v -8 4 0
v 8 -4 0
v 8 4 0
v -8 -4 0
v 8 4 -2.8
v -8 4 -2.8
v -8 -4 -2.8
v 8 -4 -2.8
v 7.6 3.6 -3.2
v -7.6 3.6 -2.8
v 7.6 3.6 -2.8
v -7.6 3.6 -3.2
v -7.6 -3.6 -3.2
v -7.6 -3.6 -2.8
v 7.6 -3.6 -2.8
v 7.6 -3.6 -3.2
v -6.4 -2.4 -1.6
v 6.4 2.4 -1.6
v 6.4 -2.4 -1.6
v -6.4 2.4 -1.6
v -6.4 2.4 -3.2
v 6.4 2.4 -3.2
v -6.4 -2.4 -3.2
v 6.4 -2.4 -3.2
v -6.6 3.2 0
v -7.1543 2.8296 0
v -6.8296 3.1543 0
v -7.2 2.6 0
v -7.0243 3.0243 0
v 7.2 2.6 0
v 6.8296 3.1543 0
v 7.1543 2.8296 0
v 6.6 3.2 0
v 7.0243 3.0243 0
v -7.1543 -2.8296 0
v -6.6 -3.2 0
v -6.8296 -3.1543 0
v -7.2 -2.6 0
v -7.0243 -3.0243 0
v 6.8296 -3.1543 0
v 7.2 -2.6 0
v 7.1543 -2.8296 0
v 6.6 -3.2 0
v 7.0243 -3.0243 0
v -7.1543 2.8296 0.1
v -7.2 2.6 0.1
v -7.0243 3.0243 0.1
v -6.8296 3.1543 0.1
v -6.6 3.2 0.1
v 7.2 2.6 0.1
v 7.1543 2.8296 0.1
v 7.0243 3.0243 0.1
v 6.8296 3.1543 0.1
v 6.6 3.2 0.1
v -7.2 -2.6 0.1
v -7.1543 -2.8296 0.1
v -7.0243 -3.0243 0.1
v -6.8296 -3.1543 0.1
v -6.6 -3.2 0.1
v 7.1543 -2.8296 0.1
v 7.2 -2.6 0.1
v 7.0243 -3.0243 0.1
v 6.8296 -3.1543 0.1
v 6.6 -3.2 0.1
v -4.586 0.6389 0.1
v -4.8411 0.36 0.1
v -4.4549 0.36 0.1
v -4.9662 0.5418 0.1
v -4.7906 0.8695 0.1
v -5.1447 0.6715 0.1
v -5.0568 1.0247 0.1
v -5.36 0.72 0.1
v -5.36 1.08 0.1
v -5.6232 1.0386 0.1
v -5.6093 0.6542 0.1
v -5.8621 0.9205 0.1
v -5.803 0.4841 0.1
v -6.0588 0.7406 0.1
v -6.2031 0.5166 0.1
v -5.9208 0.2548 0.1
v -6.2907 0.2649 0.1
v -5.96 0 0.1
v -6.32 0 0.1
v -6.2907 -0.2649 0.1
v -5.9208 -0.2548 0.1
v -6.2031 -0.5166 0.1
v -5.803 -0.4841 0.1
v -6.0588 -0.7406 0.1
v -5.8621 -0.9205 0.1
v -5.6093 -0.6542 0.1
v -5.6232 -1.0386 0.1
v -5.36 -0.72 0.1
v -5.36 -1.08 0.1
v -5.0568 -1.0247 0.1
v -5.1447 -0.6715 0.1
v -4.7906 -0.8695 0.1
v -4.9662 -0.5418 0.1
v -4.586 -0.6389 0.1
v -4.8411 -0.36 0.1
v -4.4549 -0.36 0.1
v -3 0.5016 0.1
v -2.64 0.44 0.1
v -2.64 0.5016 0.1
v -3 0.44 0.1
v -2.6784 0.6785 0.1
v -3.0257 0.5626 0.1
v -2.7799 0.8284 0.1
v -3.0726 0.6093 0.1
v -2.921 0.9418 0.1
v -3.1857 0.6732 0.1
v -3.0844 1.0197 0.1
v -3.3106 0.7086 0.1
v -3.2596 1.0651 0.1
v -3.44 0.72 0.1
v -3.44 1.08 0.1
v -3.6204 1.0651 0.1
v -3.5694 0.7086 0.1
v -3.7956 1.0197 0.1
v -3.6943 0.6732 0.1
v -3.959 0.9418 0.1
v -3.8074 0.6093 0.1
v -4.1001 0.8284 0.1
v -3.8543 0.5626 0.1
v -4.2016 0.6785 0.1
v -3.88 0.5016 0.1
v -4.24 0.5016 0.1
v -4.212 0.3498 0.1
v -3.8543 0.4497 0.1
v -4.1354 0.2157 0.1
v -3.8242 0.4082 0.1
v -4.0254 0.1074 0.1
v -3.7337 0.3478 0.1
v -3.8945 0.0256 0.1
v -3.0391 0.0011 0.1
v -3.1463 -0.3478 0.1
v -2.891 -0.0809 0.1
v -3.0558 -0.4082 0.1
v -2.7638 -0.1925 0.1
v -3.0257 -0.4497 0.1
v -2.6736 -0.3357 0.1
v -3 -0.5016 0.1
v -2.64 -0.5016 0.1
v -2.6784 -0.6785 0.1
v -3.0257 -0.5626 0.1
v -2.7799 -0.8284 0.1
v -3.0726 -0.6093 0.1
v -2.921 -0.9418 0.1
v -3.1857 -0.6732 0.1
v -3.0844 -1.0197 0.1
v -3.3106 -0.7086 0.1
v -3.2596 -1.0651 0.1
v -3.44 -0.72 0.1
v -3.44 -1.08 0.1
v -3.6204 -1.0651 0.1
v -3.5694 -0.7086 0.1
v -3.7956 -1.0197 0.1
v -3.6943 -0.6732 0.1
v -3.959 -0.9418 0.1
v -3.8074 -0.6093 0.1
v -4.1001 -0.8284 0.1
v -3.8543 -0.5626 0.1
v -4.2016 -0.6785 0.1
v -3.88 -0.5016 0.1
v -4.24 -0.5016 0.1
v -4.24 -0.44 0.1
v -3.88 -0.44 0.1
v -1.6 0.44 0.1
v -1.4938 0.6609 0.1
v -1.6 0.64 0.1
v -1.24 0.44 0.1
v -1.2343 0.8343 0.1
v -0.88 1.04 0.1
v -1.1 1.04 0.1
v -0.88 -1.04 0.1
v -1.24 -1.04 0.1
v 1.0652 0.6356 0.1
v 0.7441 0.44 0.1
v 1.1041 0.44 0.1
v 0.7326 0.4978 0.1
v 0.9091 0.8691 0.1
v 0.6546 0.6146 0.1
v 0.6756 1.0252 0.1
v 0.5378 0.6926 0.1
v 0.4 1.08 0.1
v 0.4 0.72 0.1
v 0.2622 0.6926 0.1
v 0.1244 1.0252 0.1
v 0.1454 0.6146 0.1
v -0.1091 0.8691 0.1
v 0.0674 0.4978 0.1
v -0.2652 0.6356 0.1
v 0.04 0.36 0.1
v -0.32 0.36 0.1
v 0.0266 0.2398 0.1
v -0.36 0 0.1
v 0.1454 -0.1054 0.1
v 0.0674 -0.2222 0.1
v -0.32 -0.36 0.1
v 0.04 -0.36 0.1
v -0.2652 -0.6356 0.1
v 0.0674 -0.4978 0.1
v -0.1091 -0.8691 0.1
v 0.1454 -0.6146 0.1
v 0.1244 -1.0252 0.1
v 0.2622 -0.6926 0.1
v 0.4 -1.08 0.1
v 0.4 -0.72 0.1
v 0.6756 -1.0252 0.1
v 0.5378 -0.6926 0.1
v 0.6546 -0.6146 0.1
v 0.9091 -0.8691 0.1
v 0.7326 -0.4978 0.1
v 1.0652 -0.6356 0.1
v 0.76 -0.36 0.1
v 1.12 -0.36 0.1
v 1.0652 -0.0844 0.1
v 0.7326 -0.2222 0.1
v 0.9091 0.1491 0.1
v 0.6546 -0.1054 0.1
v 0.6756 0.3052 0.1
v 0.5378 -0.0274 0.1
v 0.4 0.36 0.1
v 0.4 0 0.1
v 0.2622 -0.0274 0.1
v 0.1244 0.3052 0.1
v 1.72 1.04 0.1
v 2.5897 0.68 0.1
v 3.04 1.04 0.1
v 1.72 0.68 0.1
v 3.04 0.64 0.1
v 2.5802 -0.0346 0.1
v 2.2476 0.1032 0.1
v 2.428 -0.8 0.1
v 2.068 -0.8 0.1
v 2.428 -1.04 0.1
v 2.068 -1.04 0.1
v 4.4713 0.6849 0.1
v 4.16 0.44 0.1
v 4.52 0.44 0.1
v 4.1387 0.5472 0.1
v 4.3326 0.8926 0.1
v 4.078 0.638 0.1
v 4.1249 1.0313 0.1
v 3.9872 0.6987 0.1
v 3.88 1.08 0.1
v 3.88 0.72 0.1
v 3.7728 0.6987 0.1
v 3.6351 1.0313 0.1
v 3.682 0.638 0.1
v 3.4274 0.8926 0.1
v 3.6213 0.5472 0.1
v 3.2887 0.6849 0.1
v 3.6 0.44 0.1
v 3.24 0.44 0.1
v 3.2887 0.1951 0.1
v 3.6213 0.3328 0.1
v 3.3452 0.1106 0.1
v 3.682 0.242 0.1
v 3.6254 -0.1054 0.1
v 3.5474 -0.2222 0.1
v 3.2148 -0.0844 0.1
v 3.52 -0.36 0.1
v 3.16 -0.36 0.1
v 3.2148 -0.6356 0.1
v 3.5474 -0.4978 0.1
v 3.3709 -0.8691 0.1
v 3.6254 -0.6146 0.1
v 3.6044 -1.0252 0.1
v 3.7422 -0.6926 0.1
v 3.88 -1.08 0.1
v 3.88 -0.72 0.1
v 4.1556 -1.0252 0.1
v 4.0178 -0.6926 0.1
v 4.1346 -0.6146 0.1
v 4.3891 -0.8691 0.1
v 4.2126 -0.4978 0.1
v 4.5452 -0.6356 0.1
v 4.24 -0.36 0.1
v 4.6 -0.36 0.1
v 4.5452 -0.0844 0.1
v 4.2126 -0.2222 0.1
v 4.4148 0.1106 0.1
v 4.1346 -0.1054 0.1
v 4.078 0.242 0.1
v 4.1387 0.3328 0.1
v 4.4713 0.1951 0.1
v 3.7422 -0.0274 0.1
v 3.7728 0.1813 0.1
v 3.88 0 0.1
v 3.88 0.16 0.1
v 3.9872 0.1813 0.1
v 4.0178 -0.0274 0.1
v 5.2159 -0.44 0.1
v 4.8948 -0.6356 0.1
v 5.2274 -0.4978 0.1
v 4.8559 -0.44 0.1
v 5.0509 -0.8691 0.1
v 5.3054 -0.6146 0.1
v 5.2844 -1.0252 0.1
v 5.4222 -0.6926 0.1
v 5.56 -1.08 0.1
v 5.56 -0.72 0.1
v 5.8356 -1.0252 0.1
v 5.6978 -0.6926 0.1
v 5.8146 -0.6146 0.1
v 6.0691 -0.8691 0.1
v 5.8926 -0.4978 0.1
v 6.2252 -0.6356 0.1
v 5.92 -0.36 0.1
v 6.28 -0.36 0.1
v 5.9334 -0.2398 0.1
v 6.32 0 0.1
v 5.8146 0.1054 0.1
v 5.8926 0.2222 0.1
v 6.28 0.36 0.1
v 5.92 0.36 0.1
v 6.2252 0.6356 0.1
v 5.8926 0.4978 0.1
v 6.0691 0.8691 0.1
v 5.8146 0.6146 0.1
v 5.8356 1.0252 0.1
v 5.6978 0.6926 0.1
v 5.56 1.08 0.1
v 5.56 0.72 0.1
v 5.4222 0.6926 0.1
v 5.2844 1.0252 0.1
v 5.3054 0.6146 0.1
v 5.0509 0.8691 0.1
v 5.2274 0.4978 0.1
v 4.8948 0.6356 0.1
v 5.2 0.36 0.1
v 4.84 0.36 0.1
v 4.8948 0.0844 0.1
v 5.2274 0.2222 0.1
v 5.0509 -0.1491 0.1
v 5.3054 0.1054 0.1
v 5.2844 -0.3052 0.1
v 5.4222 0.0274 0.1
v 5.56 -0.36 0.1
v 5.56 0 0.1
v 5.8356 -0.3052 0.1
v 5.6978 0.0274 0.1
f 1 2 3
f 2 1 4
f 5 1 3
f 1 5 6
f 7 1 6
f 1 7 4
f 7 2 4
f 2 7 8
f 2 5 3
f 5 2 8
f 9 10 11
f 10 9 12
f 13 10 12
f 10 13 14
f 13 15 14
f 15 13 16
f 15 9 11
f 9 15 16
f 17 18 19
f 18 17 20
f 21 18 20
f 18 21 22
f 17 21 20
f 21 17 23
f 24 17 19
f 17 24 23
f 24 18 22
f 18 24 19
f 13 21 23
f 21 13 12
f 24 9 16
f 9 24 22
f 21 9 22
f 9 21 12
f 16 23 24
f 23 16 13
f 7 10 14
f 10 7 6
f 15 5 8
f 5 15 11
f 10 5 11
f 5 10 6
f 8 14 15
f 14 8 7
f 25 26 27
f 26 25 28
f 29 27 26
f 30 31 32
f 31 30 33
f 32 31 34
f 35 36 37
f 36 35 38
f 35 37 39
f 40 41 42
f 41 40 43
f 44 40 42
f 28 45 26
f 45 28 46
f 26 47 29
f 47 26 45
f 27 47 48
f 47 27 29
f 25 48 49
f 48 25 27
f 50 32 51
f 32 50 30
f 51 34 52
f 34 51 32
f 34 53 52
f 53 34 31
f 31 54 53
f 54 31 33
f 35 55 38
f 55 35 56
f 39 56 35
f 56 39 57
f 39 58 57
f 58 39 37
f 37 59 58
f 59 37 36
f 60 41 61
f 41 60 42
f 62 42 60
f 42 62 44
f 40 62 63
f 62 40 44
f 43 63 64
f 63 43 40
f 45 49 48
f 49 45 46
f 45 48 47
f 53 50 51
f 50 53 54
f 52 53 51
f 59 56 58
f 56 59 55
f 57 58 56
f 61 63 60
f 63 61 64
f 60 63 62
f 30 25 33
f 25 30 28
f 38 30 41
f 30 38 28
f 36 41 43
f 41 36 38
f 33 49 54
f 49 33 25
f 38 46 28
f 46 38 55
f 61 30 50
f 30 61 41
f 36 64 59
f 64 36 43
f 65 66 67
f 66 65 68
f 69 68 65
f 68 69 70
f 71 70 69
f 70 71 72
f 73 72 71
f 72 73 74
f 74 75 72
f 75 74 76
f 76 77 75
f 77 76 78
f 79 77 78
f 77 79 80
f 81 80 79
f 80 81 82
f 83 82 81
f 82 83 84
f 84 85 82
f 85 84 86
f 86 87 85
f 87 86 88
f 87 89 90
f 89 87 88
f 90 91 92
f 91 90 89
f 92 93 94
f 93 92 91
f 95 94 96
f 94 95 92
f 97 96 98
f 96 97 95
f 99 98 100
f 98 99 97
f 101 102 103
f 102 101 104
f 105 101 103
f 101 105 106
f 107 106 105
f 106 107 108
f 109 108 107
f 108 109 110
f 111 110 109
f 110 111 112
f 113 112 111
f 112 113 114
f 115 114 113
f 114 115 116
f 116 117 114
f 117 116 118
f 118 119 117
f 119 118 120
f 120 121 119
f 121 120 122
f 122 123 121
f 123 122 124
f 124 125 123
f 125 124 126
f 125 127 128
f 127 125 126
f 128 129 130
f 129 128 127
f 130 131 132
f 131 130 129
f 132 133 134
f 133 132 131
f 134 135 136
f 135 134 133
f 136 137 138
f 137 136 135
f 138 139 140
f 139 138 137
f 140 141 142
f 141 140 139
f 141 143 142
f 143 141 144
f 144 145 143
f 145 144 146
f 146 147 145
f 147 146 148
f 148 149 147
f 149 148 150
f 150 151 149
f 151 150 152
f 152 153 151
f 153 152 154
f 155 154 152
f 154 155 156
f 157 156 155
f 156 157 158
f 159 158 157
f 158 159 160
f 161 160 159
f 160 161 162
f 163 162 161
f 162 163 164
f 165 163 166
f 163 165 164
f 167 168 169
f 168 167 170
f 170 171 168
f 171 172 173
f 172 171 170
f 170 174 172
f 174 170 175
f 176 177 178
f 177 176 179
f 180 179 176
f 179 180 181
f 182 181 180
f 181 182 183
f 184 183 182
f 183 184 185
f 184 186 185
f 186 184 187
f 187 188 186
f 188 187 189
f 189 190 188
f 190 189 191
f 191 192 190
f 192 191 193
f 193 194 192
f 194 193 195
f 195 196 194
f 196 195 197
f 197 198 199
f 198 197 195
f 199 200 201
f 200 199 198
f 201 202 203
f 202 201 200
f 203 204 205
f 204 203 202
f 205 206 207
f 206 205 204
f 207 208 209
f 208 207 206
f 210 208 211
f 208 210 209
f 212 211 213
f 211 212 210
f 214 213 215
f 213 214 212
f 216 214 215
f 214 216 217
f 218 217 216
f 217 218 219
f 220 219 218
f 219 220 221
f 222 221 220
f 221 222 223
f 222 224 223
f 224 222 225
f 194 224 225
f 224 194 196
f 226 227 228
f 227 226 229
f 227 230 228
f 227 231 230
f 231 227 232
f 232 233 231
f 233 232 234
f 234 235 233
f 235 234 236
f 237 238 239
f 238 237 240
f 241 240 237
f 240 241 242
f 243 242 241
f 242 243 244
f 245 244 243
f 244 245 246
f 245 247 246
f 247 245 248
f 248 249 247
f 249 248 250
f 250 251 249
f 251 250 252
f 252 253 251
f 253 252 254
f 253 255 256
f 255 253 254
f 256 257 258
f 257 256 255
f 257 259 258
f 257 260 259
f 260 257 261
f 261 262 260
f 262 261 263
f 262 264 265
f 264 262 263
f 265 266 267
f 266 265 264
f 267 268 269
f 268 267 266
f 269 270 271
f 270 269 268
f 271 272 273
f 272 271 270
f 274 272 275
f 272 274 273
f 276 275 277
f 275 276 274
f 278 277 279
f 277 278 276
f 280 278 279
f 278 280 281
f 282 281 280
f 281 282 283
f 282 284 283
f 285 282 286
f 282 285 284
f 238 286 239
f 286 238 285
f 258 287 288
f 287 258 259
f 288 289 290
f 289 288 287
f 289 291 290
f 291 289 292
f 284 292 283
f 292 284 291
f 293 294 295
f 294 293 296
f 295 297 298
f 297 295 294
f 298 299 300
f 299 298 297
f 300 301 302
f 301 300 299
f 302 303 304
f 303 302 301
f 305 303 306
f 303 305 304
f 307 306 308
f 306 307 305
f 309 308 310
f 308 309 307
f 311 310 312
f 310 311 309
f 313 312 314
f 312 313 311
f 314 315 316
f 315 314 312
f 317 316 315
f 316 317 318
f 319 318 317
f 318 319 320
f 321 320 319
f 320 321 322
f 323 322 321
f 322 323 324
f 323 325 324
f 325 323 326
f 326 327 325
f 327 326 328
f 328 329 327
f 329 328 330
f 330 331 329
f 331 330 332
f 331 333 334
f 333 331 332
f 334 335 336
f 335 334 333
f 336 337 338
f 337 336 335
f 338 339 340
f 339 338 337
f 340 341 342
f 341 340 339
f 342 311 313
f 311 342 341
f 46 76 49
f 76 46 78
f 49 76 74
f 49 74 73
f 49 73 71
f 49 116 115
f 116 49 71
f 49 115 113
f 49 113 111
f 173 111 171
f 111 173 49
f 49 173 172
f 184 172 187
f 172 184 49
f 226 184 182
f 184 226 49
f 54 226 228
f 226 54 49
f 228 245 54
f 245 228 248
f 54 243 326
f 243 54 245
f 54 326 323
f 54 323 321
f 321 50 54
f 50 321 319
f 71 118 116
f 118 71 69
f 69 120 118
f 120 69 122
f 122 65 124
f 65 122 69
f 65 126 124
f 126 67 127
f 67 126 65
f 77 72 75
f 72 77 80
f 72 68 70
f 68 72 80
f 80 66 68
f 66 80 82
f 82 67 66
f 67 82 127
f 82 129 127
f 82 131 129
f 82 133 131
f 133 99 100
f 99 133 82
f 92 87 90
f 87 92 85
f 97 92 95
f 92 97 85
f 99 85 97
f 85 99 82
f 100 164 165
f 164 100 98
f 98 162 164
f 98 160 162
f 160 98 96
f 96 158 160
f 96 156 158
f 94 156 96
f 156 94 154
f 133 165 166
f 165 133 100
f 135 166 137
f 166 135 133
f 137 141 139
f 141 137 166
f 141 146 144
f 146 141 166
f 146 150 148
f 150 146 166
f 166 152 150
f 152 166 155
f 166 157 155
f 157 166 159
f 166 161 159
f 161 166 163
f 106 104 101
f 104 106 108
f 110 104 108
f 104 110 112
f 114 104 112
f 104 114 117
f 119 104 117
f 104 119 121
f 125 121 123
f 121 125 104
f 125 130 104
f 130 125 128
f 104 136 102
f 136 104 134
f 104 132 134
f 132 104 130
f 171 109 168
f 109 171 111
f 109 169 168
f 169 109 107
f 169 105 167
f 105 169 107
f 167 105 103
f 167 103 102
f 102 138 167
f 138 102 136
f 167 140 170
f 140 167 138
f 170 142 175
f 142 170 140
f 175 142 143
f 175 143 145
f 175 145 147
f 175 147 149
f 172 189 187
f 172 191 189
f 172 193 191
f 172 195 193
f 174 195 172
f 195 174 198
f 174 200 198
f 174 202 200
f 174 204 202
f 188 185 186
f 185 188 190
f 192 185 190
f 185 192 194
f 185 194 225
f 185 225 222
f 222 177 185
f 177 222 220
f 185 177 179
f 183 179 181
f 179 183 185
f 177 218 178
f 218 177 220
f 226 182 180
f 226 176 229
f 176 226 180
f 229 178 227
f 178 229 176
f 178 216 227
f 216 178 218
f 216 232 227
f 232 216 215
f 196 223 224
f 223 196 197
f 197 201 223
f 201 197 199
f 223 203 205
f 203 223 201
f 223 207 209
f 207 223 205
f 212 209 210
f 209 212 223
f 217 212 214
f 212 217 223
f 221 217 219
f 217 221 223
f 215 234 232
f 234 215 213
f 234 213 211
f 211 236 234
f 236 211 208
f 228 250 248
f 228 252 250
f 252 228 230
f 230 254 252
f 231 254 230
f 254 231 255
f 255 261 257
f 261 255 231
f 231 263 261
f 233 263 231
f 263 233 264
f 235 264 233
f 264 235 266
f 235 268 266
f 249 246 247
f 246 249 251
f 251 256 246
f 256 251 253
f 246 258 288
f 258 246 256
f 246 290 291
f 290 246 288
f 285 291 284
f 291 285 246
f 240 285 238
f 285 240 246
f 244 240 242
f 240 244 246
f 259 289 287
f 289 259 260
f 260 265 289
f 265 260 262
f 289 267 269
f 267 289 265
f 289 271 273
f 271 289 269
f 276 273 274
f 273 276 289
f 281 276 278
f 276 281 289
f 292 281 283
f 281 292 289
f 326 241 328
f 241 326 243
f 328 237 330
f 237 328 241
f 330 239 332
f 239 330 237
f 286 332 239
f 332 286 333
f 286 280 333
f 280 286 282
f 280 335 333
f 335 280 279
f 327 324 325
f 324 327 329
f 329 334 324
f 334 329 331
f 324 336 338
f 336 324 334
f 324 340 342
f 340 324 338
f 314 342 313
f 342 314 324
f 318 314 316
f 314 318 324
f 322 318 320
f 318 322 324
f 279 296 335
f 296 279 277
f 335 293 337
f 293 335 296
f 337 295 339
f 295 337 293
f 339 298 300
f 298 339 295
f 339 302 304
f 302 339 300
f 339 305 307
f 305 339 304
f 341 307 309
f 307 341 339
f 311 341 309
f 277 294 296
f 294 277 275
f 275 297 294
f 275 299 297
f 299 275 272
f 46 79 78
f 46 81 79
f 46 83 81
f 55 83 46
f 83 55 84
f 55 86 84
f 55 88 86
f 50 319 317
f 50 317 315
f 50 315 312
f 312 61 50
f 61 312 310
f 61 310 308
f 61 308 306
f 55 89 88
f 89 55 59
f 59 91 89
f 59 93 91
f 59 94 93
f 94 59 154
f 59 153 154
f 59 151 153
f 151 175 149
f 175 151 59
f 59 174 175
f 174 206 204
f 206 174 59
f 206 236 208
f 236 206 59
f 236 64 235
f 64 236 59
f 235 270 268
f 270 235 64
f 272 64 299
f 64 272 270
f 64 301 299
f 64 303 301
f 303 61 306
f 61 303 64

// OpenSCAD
use <../lib.scad>
use <3069b.scad>
use <6141875c.scad>
function ldraw_lib__3069bd2q() = [
// 0 Tile  1 x  2 with Black License Plate "CS 16 789" on White Background Sticker
// 0 Name: 3069bd2q.dat
// 0 Author: Alfred Schmitz [AlfredS]
// 0 !LDRAW_ORG Shortcut UPDATE 2026-08
// 0 !LICENSE Licensed under CC BY 4.0 : see CAreadme.txt
// 
// 0 BFC CERTIFY CCW
  [0,"BFC","CERTIFY"],
  [0,"BFC","CCW"],
// 
// 0 !CATEGORY Sticker Shortcut
// 0 !KEYWORDS F-150, Ford, Raptor, Set 75875, Speed Champions
// 
// 0 !HISTORY 2026-08-31 [OrionP] Official Update 2026-08
// 
// 1 16 0 0 0 1 0 0 0 1 0 0 0 1 3069b.dat
  [1,16,0,0,0,1,0,0,0,1,0,0,0,1, ldraw_lib__3069b()],
// 1 16 0 0 0 1 0 0 0 1 0 0 0 1 6141875c.dat
  [1,16,0,0,0,1,0,0,0,1,0,0,0,1, ldraw_lib__6141875c()],
];
module ldraw_lib__3069bd2q(step=0, col=false, unit=2/5, alt=false, line=0.2, solid=!$preview)
    makepoly(ldraw_lib__3069bd2q(), step=step, col=col, unit=unit, alt=alt, line=line, solid=solid);
ldraw_lib__3069bd2q(line=0.2);
